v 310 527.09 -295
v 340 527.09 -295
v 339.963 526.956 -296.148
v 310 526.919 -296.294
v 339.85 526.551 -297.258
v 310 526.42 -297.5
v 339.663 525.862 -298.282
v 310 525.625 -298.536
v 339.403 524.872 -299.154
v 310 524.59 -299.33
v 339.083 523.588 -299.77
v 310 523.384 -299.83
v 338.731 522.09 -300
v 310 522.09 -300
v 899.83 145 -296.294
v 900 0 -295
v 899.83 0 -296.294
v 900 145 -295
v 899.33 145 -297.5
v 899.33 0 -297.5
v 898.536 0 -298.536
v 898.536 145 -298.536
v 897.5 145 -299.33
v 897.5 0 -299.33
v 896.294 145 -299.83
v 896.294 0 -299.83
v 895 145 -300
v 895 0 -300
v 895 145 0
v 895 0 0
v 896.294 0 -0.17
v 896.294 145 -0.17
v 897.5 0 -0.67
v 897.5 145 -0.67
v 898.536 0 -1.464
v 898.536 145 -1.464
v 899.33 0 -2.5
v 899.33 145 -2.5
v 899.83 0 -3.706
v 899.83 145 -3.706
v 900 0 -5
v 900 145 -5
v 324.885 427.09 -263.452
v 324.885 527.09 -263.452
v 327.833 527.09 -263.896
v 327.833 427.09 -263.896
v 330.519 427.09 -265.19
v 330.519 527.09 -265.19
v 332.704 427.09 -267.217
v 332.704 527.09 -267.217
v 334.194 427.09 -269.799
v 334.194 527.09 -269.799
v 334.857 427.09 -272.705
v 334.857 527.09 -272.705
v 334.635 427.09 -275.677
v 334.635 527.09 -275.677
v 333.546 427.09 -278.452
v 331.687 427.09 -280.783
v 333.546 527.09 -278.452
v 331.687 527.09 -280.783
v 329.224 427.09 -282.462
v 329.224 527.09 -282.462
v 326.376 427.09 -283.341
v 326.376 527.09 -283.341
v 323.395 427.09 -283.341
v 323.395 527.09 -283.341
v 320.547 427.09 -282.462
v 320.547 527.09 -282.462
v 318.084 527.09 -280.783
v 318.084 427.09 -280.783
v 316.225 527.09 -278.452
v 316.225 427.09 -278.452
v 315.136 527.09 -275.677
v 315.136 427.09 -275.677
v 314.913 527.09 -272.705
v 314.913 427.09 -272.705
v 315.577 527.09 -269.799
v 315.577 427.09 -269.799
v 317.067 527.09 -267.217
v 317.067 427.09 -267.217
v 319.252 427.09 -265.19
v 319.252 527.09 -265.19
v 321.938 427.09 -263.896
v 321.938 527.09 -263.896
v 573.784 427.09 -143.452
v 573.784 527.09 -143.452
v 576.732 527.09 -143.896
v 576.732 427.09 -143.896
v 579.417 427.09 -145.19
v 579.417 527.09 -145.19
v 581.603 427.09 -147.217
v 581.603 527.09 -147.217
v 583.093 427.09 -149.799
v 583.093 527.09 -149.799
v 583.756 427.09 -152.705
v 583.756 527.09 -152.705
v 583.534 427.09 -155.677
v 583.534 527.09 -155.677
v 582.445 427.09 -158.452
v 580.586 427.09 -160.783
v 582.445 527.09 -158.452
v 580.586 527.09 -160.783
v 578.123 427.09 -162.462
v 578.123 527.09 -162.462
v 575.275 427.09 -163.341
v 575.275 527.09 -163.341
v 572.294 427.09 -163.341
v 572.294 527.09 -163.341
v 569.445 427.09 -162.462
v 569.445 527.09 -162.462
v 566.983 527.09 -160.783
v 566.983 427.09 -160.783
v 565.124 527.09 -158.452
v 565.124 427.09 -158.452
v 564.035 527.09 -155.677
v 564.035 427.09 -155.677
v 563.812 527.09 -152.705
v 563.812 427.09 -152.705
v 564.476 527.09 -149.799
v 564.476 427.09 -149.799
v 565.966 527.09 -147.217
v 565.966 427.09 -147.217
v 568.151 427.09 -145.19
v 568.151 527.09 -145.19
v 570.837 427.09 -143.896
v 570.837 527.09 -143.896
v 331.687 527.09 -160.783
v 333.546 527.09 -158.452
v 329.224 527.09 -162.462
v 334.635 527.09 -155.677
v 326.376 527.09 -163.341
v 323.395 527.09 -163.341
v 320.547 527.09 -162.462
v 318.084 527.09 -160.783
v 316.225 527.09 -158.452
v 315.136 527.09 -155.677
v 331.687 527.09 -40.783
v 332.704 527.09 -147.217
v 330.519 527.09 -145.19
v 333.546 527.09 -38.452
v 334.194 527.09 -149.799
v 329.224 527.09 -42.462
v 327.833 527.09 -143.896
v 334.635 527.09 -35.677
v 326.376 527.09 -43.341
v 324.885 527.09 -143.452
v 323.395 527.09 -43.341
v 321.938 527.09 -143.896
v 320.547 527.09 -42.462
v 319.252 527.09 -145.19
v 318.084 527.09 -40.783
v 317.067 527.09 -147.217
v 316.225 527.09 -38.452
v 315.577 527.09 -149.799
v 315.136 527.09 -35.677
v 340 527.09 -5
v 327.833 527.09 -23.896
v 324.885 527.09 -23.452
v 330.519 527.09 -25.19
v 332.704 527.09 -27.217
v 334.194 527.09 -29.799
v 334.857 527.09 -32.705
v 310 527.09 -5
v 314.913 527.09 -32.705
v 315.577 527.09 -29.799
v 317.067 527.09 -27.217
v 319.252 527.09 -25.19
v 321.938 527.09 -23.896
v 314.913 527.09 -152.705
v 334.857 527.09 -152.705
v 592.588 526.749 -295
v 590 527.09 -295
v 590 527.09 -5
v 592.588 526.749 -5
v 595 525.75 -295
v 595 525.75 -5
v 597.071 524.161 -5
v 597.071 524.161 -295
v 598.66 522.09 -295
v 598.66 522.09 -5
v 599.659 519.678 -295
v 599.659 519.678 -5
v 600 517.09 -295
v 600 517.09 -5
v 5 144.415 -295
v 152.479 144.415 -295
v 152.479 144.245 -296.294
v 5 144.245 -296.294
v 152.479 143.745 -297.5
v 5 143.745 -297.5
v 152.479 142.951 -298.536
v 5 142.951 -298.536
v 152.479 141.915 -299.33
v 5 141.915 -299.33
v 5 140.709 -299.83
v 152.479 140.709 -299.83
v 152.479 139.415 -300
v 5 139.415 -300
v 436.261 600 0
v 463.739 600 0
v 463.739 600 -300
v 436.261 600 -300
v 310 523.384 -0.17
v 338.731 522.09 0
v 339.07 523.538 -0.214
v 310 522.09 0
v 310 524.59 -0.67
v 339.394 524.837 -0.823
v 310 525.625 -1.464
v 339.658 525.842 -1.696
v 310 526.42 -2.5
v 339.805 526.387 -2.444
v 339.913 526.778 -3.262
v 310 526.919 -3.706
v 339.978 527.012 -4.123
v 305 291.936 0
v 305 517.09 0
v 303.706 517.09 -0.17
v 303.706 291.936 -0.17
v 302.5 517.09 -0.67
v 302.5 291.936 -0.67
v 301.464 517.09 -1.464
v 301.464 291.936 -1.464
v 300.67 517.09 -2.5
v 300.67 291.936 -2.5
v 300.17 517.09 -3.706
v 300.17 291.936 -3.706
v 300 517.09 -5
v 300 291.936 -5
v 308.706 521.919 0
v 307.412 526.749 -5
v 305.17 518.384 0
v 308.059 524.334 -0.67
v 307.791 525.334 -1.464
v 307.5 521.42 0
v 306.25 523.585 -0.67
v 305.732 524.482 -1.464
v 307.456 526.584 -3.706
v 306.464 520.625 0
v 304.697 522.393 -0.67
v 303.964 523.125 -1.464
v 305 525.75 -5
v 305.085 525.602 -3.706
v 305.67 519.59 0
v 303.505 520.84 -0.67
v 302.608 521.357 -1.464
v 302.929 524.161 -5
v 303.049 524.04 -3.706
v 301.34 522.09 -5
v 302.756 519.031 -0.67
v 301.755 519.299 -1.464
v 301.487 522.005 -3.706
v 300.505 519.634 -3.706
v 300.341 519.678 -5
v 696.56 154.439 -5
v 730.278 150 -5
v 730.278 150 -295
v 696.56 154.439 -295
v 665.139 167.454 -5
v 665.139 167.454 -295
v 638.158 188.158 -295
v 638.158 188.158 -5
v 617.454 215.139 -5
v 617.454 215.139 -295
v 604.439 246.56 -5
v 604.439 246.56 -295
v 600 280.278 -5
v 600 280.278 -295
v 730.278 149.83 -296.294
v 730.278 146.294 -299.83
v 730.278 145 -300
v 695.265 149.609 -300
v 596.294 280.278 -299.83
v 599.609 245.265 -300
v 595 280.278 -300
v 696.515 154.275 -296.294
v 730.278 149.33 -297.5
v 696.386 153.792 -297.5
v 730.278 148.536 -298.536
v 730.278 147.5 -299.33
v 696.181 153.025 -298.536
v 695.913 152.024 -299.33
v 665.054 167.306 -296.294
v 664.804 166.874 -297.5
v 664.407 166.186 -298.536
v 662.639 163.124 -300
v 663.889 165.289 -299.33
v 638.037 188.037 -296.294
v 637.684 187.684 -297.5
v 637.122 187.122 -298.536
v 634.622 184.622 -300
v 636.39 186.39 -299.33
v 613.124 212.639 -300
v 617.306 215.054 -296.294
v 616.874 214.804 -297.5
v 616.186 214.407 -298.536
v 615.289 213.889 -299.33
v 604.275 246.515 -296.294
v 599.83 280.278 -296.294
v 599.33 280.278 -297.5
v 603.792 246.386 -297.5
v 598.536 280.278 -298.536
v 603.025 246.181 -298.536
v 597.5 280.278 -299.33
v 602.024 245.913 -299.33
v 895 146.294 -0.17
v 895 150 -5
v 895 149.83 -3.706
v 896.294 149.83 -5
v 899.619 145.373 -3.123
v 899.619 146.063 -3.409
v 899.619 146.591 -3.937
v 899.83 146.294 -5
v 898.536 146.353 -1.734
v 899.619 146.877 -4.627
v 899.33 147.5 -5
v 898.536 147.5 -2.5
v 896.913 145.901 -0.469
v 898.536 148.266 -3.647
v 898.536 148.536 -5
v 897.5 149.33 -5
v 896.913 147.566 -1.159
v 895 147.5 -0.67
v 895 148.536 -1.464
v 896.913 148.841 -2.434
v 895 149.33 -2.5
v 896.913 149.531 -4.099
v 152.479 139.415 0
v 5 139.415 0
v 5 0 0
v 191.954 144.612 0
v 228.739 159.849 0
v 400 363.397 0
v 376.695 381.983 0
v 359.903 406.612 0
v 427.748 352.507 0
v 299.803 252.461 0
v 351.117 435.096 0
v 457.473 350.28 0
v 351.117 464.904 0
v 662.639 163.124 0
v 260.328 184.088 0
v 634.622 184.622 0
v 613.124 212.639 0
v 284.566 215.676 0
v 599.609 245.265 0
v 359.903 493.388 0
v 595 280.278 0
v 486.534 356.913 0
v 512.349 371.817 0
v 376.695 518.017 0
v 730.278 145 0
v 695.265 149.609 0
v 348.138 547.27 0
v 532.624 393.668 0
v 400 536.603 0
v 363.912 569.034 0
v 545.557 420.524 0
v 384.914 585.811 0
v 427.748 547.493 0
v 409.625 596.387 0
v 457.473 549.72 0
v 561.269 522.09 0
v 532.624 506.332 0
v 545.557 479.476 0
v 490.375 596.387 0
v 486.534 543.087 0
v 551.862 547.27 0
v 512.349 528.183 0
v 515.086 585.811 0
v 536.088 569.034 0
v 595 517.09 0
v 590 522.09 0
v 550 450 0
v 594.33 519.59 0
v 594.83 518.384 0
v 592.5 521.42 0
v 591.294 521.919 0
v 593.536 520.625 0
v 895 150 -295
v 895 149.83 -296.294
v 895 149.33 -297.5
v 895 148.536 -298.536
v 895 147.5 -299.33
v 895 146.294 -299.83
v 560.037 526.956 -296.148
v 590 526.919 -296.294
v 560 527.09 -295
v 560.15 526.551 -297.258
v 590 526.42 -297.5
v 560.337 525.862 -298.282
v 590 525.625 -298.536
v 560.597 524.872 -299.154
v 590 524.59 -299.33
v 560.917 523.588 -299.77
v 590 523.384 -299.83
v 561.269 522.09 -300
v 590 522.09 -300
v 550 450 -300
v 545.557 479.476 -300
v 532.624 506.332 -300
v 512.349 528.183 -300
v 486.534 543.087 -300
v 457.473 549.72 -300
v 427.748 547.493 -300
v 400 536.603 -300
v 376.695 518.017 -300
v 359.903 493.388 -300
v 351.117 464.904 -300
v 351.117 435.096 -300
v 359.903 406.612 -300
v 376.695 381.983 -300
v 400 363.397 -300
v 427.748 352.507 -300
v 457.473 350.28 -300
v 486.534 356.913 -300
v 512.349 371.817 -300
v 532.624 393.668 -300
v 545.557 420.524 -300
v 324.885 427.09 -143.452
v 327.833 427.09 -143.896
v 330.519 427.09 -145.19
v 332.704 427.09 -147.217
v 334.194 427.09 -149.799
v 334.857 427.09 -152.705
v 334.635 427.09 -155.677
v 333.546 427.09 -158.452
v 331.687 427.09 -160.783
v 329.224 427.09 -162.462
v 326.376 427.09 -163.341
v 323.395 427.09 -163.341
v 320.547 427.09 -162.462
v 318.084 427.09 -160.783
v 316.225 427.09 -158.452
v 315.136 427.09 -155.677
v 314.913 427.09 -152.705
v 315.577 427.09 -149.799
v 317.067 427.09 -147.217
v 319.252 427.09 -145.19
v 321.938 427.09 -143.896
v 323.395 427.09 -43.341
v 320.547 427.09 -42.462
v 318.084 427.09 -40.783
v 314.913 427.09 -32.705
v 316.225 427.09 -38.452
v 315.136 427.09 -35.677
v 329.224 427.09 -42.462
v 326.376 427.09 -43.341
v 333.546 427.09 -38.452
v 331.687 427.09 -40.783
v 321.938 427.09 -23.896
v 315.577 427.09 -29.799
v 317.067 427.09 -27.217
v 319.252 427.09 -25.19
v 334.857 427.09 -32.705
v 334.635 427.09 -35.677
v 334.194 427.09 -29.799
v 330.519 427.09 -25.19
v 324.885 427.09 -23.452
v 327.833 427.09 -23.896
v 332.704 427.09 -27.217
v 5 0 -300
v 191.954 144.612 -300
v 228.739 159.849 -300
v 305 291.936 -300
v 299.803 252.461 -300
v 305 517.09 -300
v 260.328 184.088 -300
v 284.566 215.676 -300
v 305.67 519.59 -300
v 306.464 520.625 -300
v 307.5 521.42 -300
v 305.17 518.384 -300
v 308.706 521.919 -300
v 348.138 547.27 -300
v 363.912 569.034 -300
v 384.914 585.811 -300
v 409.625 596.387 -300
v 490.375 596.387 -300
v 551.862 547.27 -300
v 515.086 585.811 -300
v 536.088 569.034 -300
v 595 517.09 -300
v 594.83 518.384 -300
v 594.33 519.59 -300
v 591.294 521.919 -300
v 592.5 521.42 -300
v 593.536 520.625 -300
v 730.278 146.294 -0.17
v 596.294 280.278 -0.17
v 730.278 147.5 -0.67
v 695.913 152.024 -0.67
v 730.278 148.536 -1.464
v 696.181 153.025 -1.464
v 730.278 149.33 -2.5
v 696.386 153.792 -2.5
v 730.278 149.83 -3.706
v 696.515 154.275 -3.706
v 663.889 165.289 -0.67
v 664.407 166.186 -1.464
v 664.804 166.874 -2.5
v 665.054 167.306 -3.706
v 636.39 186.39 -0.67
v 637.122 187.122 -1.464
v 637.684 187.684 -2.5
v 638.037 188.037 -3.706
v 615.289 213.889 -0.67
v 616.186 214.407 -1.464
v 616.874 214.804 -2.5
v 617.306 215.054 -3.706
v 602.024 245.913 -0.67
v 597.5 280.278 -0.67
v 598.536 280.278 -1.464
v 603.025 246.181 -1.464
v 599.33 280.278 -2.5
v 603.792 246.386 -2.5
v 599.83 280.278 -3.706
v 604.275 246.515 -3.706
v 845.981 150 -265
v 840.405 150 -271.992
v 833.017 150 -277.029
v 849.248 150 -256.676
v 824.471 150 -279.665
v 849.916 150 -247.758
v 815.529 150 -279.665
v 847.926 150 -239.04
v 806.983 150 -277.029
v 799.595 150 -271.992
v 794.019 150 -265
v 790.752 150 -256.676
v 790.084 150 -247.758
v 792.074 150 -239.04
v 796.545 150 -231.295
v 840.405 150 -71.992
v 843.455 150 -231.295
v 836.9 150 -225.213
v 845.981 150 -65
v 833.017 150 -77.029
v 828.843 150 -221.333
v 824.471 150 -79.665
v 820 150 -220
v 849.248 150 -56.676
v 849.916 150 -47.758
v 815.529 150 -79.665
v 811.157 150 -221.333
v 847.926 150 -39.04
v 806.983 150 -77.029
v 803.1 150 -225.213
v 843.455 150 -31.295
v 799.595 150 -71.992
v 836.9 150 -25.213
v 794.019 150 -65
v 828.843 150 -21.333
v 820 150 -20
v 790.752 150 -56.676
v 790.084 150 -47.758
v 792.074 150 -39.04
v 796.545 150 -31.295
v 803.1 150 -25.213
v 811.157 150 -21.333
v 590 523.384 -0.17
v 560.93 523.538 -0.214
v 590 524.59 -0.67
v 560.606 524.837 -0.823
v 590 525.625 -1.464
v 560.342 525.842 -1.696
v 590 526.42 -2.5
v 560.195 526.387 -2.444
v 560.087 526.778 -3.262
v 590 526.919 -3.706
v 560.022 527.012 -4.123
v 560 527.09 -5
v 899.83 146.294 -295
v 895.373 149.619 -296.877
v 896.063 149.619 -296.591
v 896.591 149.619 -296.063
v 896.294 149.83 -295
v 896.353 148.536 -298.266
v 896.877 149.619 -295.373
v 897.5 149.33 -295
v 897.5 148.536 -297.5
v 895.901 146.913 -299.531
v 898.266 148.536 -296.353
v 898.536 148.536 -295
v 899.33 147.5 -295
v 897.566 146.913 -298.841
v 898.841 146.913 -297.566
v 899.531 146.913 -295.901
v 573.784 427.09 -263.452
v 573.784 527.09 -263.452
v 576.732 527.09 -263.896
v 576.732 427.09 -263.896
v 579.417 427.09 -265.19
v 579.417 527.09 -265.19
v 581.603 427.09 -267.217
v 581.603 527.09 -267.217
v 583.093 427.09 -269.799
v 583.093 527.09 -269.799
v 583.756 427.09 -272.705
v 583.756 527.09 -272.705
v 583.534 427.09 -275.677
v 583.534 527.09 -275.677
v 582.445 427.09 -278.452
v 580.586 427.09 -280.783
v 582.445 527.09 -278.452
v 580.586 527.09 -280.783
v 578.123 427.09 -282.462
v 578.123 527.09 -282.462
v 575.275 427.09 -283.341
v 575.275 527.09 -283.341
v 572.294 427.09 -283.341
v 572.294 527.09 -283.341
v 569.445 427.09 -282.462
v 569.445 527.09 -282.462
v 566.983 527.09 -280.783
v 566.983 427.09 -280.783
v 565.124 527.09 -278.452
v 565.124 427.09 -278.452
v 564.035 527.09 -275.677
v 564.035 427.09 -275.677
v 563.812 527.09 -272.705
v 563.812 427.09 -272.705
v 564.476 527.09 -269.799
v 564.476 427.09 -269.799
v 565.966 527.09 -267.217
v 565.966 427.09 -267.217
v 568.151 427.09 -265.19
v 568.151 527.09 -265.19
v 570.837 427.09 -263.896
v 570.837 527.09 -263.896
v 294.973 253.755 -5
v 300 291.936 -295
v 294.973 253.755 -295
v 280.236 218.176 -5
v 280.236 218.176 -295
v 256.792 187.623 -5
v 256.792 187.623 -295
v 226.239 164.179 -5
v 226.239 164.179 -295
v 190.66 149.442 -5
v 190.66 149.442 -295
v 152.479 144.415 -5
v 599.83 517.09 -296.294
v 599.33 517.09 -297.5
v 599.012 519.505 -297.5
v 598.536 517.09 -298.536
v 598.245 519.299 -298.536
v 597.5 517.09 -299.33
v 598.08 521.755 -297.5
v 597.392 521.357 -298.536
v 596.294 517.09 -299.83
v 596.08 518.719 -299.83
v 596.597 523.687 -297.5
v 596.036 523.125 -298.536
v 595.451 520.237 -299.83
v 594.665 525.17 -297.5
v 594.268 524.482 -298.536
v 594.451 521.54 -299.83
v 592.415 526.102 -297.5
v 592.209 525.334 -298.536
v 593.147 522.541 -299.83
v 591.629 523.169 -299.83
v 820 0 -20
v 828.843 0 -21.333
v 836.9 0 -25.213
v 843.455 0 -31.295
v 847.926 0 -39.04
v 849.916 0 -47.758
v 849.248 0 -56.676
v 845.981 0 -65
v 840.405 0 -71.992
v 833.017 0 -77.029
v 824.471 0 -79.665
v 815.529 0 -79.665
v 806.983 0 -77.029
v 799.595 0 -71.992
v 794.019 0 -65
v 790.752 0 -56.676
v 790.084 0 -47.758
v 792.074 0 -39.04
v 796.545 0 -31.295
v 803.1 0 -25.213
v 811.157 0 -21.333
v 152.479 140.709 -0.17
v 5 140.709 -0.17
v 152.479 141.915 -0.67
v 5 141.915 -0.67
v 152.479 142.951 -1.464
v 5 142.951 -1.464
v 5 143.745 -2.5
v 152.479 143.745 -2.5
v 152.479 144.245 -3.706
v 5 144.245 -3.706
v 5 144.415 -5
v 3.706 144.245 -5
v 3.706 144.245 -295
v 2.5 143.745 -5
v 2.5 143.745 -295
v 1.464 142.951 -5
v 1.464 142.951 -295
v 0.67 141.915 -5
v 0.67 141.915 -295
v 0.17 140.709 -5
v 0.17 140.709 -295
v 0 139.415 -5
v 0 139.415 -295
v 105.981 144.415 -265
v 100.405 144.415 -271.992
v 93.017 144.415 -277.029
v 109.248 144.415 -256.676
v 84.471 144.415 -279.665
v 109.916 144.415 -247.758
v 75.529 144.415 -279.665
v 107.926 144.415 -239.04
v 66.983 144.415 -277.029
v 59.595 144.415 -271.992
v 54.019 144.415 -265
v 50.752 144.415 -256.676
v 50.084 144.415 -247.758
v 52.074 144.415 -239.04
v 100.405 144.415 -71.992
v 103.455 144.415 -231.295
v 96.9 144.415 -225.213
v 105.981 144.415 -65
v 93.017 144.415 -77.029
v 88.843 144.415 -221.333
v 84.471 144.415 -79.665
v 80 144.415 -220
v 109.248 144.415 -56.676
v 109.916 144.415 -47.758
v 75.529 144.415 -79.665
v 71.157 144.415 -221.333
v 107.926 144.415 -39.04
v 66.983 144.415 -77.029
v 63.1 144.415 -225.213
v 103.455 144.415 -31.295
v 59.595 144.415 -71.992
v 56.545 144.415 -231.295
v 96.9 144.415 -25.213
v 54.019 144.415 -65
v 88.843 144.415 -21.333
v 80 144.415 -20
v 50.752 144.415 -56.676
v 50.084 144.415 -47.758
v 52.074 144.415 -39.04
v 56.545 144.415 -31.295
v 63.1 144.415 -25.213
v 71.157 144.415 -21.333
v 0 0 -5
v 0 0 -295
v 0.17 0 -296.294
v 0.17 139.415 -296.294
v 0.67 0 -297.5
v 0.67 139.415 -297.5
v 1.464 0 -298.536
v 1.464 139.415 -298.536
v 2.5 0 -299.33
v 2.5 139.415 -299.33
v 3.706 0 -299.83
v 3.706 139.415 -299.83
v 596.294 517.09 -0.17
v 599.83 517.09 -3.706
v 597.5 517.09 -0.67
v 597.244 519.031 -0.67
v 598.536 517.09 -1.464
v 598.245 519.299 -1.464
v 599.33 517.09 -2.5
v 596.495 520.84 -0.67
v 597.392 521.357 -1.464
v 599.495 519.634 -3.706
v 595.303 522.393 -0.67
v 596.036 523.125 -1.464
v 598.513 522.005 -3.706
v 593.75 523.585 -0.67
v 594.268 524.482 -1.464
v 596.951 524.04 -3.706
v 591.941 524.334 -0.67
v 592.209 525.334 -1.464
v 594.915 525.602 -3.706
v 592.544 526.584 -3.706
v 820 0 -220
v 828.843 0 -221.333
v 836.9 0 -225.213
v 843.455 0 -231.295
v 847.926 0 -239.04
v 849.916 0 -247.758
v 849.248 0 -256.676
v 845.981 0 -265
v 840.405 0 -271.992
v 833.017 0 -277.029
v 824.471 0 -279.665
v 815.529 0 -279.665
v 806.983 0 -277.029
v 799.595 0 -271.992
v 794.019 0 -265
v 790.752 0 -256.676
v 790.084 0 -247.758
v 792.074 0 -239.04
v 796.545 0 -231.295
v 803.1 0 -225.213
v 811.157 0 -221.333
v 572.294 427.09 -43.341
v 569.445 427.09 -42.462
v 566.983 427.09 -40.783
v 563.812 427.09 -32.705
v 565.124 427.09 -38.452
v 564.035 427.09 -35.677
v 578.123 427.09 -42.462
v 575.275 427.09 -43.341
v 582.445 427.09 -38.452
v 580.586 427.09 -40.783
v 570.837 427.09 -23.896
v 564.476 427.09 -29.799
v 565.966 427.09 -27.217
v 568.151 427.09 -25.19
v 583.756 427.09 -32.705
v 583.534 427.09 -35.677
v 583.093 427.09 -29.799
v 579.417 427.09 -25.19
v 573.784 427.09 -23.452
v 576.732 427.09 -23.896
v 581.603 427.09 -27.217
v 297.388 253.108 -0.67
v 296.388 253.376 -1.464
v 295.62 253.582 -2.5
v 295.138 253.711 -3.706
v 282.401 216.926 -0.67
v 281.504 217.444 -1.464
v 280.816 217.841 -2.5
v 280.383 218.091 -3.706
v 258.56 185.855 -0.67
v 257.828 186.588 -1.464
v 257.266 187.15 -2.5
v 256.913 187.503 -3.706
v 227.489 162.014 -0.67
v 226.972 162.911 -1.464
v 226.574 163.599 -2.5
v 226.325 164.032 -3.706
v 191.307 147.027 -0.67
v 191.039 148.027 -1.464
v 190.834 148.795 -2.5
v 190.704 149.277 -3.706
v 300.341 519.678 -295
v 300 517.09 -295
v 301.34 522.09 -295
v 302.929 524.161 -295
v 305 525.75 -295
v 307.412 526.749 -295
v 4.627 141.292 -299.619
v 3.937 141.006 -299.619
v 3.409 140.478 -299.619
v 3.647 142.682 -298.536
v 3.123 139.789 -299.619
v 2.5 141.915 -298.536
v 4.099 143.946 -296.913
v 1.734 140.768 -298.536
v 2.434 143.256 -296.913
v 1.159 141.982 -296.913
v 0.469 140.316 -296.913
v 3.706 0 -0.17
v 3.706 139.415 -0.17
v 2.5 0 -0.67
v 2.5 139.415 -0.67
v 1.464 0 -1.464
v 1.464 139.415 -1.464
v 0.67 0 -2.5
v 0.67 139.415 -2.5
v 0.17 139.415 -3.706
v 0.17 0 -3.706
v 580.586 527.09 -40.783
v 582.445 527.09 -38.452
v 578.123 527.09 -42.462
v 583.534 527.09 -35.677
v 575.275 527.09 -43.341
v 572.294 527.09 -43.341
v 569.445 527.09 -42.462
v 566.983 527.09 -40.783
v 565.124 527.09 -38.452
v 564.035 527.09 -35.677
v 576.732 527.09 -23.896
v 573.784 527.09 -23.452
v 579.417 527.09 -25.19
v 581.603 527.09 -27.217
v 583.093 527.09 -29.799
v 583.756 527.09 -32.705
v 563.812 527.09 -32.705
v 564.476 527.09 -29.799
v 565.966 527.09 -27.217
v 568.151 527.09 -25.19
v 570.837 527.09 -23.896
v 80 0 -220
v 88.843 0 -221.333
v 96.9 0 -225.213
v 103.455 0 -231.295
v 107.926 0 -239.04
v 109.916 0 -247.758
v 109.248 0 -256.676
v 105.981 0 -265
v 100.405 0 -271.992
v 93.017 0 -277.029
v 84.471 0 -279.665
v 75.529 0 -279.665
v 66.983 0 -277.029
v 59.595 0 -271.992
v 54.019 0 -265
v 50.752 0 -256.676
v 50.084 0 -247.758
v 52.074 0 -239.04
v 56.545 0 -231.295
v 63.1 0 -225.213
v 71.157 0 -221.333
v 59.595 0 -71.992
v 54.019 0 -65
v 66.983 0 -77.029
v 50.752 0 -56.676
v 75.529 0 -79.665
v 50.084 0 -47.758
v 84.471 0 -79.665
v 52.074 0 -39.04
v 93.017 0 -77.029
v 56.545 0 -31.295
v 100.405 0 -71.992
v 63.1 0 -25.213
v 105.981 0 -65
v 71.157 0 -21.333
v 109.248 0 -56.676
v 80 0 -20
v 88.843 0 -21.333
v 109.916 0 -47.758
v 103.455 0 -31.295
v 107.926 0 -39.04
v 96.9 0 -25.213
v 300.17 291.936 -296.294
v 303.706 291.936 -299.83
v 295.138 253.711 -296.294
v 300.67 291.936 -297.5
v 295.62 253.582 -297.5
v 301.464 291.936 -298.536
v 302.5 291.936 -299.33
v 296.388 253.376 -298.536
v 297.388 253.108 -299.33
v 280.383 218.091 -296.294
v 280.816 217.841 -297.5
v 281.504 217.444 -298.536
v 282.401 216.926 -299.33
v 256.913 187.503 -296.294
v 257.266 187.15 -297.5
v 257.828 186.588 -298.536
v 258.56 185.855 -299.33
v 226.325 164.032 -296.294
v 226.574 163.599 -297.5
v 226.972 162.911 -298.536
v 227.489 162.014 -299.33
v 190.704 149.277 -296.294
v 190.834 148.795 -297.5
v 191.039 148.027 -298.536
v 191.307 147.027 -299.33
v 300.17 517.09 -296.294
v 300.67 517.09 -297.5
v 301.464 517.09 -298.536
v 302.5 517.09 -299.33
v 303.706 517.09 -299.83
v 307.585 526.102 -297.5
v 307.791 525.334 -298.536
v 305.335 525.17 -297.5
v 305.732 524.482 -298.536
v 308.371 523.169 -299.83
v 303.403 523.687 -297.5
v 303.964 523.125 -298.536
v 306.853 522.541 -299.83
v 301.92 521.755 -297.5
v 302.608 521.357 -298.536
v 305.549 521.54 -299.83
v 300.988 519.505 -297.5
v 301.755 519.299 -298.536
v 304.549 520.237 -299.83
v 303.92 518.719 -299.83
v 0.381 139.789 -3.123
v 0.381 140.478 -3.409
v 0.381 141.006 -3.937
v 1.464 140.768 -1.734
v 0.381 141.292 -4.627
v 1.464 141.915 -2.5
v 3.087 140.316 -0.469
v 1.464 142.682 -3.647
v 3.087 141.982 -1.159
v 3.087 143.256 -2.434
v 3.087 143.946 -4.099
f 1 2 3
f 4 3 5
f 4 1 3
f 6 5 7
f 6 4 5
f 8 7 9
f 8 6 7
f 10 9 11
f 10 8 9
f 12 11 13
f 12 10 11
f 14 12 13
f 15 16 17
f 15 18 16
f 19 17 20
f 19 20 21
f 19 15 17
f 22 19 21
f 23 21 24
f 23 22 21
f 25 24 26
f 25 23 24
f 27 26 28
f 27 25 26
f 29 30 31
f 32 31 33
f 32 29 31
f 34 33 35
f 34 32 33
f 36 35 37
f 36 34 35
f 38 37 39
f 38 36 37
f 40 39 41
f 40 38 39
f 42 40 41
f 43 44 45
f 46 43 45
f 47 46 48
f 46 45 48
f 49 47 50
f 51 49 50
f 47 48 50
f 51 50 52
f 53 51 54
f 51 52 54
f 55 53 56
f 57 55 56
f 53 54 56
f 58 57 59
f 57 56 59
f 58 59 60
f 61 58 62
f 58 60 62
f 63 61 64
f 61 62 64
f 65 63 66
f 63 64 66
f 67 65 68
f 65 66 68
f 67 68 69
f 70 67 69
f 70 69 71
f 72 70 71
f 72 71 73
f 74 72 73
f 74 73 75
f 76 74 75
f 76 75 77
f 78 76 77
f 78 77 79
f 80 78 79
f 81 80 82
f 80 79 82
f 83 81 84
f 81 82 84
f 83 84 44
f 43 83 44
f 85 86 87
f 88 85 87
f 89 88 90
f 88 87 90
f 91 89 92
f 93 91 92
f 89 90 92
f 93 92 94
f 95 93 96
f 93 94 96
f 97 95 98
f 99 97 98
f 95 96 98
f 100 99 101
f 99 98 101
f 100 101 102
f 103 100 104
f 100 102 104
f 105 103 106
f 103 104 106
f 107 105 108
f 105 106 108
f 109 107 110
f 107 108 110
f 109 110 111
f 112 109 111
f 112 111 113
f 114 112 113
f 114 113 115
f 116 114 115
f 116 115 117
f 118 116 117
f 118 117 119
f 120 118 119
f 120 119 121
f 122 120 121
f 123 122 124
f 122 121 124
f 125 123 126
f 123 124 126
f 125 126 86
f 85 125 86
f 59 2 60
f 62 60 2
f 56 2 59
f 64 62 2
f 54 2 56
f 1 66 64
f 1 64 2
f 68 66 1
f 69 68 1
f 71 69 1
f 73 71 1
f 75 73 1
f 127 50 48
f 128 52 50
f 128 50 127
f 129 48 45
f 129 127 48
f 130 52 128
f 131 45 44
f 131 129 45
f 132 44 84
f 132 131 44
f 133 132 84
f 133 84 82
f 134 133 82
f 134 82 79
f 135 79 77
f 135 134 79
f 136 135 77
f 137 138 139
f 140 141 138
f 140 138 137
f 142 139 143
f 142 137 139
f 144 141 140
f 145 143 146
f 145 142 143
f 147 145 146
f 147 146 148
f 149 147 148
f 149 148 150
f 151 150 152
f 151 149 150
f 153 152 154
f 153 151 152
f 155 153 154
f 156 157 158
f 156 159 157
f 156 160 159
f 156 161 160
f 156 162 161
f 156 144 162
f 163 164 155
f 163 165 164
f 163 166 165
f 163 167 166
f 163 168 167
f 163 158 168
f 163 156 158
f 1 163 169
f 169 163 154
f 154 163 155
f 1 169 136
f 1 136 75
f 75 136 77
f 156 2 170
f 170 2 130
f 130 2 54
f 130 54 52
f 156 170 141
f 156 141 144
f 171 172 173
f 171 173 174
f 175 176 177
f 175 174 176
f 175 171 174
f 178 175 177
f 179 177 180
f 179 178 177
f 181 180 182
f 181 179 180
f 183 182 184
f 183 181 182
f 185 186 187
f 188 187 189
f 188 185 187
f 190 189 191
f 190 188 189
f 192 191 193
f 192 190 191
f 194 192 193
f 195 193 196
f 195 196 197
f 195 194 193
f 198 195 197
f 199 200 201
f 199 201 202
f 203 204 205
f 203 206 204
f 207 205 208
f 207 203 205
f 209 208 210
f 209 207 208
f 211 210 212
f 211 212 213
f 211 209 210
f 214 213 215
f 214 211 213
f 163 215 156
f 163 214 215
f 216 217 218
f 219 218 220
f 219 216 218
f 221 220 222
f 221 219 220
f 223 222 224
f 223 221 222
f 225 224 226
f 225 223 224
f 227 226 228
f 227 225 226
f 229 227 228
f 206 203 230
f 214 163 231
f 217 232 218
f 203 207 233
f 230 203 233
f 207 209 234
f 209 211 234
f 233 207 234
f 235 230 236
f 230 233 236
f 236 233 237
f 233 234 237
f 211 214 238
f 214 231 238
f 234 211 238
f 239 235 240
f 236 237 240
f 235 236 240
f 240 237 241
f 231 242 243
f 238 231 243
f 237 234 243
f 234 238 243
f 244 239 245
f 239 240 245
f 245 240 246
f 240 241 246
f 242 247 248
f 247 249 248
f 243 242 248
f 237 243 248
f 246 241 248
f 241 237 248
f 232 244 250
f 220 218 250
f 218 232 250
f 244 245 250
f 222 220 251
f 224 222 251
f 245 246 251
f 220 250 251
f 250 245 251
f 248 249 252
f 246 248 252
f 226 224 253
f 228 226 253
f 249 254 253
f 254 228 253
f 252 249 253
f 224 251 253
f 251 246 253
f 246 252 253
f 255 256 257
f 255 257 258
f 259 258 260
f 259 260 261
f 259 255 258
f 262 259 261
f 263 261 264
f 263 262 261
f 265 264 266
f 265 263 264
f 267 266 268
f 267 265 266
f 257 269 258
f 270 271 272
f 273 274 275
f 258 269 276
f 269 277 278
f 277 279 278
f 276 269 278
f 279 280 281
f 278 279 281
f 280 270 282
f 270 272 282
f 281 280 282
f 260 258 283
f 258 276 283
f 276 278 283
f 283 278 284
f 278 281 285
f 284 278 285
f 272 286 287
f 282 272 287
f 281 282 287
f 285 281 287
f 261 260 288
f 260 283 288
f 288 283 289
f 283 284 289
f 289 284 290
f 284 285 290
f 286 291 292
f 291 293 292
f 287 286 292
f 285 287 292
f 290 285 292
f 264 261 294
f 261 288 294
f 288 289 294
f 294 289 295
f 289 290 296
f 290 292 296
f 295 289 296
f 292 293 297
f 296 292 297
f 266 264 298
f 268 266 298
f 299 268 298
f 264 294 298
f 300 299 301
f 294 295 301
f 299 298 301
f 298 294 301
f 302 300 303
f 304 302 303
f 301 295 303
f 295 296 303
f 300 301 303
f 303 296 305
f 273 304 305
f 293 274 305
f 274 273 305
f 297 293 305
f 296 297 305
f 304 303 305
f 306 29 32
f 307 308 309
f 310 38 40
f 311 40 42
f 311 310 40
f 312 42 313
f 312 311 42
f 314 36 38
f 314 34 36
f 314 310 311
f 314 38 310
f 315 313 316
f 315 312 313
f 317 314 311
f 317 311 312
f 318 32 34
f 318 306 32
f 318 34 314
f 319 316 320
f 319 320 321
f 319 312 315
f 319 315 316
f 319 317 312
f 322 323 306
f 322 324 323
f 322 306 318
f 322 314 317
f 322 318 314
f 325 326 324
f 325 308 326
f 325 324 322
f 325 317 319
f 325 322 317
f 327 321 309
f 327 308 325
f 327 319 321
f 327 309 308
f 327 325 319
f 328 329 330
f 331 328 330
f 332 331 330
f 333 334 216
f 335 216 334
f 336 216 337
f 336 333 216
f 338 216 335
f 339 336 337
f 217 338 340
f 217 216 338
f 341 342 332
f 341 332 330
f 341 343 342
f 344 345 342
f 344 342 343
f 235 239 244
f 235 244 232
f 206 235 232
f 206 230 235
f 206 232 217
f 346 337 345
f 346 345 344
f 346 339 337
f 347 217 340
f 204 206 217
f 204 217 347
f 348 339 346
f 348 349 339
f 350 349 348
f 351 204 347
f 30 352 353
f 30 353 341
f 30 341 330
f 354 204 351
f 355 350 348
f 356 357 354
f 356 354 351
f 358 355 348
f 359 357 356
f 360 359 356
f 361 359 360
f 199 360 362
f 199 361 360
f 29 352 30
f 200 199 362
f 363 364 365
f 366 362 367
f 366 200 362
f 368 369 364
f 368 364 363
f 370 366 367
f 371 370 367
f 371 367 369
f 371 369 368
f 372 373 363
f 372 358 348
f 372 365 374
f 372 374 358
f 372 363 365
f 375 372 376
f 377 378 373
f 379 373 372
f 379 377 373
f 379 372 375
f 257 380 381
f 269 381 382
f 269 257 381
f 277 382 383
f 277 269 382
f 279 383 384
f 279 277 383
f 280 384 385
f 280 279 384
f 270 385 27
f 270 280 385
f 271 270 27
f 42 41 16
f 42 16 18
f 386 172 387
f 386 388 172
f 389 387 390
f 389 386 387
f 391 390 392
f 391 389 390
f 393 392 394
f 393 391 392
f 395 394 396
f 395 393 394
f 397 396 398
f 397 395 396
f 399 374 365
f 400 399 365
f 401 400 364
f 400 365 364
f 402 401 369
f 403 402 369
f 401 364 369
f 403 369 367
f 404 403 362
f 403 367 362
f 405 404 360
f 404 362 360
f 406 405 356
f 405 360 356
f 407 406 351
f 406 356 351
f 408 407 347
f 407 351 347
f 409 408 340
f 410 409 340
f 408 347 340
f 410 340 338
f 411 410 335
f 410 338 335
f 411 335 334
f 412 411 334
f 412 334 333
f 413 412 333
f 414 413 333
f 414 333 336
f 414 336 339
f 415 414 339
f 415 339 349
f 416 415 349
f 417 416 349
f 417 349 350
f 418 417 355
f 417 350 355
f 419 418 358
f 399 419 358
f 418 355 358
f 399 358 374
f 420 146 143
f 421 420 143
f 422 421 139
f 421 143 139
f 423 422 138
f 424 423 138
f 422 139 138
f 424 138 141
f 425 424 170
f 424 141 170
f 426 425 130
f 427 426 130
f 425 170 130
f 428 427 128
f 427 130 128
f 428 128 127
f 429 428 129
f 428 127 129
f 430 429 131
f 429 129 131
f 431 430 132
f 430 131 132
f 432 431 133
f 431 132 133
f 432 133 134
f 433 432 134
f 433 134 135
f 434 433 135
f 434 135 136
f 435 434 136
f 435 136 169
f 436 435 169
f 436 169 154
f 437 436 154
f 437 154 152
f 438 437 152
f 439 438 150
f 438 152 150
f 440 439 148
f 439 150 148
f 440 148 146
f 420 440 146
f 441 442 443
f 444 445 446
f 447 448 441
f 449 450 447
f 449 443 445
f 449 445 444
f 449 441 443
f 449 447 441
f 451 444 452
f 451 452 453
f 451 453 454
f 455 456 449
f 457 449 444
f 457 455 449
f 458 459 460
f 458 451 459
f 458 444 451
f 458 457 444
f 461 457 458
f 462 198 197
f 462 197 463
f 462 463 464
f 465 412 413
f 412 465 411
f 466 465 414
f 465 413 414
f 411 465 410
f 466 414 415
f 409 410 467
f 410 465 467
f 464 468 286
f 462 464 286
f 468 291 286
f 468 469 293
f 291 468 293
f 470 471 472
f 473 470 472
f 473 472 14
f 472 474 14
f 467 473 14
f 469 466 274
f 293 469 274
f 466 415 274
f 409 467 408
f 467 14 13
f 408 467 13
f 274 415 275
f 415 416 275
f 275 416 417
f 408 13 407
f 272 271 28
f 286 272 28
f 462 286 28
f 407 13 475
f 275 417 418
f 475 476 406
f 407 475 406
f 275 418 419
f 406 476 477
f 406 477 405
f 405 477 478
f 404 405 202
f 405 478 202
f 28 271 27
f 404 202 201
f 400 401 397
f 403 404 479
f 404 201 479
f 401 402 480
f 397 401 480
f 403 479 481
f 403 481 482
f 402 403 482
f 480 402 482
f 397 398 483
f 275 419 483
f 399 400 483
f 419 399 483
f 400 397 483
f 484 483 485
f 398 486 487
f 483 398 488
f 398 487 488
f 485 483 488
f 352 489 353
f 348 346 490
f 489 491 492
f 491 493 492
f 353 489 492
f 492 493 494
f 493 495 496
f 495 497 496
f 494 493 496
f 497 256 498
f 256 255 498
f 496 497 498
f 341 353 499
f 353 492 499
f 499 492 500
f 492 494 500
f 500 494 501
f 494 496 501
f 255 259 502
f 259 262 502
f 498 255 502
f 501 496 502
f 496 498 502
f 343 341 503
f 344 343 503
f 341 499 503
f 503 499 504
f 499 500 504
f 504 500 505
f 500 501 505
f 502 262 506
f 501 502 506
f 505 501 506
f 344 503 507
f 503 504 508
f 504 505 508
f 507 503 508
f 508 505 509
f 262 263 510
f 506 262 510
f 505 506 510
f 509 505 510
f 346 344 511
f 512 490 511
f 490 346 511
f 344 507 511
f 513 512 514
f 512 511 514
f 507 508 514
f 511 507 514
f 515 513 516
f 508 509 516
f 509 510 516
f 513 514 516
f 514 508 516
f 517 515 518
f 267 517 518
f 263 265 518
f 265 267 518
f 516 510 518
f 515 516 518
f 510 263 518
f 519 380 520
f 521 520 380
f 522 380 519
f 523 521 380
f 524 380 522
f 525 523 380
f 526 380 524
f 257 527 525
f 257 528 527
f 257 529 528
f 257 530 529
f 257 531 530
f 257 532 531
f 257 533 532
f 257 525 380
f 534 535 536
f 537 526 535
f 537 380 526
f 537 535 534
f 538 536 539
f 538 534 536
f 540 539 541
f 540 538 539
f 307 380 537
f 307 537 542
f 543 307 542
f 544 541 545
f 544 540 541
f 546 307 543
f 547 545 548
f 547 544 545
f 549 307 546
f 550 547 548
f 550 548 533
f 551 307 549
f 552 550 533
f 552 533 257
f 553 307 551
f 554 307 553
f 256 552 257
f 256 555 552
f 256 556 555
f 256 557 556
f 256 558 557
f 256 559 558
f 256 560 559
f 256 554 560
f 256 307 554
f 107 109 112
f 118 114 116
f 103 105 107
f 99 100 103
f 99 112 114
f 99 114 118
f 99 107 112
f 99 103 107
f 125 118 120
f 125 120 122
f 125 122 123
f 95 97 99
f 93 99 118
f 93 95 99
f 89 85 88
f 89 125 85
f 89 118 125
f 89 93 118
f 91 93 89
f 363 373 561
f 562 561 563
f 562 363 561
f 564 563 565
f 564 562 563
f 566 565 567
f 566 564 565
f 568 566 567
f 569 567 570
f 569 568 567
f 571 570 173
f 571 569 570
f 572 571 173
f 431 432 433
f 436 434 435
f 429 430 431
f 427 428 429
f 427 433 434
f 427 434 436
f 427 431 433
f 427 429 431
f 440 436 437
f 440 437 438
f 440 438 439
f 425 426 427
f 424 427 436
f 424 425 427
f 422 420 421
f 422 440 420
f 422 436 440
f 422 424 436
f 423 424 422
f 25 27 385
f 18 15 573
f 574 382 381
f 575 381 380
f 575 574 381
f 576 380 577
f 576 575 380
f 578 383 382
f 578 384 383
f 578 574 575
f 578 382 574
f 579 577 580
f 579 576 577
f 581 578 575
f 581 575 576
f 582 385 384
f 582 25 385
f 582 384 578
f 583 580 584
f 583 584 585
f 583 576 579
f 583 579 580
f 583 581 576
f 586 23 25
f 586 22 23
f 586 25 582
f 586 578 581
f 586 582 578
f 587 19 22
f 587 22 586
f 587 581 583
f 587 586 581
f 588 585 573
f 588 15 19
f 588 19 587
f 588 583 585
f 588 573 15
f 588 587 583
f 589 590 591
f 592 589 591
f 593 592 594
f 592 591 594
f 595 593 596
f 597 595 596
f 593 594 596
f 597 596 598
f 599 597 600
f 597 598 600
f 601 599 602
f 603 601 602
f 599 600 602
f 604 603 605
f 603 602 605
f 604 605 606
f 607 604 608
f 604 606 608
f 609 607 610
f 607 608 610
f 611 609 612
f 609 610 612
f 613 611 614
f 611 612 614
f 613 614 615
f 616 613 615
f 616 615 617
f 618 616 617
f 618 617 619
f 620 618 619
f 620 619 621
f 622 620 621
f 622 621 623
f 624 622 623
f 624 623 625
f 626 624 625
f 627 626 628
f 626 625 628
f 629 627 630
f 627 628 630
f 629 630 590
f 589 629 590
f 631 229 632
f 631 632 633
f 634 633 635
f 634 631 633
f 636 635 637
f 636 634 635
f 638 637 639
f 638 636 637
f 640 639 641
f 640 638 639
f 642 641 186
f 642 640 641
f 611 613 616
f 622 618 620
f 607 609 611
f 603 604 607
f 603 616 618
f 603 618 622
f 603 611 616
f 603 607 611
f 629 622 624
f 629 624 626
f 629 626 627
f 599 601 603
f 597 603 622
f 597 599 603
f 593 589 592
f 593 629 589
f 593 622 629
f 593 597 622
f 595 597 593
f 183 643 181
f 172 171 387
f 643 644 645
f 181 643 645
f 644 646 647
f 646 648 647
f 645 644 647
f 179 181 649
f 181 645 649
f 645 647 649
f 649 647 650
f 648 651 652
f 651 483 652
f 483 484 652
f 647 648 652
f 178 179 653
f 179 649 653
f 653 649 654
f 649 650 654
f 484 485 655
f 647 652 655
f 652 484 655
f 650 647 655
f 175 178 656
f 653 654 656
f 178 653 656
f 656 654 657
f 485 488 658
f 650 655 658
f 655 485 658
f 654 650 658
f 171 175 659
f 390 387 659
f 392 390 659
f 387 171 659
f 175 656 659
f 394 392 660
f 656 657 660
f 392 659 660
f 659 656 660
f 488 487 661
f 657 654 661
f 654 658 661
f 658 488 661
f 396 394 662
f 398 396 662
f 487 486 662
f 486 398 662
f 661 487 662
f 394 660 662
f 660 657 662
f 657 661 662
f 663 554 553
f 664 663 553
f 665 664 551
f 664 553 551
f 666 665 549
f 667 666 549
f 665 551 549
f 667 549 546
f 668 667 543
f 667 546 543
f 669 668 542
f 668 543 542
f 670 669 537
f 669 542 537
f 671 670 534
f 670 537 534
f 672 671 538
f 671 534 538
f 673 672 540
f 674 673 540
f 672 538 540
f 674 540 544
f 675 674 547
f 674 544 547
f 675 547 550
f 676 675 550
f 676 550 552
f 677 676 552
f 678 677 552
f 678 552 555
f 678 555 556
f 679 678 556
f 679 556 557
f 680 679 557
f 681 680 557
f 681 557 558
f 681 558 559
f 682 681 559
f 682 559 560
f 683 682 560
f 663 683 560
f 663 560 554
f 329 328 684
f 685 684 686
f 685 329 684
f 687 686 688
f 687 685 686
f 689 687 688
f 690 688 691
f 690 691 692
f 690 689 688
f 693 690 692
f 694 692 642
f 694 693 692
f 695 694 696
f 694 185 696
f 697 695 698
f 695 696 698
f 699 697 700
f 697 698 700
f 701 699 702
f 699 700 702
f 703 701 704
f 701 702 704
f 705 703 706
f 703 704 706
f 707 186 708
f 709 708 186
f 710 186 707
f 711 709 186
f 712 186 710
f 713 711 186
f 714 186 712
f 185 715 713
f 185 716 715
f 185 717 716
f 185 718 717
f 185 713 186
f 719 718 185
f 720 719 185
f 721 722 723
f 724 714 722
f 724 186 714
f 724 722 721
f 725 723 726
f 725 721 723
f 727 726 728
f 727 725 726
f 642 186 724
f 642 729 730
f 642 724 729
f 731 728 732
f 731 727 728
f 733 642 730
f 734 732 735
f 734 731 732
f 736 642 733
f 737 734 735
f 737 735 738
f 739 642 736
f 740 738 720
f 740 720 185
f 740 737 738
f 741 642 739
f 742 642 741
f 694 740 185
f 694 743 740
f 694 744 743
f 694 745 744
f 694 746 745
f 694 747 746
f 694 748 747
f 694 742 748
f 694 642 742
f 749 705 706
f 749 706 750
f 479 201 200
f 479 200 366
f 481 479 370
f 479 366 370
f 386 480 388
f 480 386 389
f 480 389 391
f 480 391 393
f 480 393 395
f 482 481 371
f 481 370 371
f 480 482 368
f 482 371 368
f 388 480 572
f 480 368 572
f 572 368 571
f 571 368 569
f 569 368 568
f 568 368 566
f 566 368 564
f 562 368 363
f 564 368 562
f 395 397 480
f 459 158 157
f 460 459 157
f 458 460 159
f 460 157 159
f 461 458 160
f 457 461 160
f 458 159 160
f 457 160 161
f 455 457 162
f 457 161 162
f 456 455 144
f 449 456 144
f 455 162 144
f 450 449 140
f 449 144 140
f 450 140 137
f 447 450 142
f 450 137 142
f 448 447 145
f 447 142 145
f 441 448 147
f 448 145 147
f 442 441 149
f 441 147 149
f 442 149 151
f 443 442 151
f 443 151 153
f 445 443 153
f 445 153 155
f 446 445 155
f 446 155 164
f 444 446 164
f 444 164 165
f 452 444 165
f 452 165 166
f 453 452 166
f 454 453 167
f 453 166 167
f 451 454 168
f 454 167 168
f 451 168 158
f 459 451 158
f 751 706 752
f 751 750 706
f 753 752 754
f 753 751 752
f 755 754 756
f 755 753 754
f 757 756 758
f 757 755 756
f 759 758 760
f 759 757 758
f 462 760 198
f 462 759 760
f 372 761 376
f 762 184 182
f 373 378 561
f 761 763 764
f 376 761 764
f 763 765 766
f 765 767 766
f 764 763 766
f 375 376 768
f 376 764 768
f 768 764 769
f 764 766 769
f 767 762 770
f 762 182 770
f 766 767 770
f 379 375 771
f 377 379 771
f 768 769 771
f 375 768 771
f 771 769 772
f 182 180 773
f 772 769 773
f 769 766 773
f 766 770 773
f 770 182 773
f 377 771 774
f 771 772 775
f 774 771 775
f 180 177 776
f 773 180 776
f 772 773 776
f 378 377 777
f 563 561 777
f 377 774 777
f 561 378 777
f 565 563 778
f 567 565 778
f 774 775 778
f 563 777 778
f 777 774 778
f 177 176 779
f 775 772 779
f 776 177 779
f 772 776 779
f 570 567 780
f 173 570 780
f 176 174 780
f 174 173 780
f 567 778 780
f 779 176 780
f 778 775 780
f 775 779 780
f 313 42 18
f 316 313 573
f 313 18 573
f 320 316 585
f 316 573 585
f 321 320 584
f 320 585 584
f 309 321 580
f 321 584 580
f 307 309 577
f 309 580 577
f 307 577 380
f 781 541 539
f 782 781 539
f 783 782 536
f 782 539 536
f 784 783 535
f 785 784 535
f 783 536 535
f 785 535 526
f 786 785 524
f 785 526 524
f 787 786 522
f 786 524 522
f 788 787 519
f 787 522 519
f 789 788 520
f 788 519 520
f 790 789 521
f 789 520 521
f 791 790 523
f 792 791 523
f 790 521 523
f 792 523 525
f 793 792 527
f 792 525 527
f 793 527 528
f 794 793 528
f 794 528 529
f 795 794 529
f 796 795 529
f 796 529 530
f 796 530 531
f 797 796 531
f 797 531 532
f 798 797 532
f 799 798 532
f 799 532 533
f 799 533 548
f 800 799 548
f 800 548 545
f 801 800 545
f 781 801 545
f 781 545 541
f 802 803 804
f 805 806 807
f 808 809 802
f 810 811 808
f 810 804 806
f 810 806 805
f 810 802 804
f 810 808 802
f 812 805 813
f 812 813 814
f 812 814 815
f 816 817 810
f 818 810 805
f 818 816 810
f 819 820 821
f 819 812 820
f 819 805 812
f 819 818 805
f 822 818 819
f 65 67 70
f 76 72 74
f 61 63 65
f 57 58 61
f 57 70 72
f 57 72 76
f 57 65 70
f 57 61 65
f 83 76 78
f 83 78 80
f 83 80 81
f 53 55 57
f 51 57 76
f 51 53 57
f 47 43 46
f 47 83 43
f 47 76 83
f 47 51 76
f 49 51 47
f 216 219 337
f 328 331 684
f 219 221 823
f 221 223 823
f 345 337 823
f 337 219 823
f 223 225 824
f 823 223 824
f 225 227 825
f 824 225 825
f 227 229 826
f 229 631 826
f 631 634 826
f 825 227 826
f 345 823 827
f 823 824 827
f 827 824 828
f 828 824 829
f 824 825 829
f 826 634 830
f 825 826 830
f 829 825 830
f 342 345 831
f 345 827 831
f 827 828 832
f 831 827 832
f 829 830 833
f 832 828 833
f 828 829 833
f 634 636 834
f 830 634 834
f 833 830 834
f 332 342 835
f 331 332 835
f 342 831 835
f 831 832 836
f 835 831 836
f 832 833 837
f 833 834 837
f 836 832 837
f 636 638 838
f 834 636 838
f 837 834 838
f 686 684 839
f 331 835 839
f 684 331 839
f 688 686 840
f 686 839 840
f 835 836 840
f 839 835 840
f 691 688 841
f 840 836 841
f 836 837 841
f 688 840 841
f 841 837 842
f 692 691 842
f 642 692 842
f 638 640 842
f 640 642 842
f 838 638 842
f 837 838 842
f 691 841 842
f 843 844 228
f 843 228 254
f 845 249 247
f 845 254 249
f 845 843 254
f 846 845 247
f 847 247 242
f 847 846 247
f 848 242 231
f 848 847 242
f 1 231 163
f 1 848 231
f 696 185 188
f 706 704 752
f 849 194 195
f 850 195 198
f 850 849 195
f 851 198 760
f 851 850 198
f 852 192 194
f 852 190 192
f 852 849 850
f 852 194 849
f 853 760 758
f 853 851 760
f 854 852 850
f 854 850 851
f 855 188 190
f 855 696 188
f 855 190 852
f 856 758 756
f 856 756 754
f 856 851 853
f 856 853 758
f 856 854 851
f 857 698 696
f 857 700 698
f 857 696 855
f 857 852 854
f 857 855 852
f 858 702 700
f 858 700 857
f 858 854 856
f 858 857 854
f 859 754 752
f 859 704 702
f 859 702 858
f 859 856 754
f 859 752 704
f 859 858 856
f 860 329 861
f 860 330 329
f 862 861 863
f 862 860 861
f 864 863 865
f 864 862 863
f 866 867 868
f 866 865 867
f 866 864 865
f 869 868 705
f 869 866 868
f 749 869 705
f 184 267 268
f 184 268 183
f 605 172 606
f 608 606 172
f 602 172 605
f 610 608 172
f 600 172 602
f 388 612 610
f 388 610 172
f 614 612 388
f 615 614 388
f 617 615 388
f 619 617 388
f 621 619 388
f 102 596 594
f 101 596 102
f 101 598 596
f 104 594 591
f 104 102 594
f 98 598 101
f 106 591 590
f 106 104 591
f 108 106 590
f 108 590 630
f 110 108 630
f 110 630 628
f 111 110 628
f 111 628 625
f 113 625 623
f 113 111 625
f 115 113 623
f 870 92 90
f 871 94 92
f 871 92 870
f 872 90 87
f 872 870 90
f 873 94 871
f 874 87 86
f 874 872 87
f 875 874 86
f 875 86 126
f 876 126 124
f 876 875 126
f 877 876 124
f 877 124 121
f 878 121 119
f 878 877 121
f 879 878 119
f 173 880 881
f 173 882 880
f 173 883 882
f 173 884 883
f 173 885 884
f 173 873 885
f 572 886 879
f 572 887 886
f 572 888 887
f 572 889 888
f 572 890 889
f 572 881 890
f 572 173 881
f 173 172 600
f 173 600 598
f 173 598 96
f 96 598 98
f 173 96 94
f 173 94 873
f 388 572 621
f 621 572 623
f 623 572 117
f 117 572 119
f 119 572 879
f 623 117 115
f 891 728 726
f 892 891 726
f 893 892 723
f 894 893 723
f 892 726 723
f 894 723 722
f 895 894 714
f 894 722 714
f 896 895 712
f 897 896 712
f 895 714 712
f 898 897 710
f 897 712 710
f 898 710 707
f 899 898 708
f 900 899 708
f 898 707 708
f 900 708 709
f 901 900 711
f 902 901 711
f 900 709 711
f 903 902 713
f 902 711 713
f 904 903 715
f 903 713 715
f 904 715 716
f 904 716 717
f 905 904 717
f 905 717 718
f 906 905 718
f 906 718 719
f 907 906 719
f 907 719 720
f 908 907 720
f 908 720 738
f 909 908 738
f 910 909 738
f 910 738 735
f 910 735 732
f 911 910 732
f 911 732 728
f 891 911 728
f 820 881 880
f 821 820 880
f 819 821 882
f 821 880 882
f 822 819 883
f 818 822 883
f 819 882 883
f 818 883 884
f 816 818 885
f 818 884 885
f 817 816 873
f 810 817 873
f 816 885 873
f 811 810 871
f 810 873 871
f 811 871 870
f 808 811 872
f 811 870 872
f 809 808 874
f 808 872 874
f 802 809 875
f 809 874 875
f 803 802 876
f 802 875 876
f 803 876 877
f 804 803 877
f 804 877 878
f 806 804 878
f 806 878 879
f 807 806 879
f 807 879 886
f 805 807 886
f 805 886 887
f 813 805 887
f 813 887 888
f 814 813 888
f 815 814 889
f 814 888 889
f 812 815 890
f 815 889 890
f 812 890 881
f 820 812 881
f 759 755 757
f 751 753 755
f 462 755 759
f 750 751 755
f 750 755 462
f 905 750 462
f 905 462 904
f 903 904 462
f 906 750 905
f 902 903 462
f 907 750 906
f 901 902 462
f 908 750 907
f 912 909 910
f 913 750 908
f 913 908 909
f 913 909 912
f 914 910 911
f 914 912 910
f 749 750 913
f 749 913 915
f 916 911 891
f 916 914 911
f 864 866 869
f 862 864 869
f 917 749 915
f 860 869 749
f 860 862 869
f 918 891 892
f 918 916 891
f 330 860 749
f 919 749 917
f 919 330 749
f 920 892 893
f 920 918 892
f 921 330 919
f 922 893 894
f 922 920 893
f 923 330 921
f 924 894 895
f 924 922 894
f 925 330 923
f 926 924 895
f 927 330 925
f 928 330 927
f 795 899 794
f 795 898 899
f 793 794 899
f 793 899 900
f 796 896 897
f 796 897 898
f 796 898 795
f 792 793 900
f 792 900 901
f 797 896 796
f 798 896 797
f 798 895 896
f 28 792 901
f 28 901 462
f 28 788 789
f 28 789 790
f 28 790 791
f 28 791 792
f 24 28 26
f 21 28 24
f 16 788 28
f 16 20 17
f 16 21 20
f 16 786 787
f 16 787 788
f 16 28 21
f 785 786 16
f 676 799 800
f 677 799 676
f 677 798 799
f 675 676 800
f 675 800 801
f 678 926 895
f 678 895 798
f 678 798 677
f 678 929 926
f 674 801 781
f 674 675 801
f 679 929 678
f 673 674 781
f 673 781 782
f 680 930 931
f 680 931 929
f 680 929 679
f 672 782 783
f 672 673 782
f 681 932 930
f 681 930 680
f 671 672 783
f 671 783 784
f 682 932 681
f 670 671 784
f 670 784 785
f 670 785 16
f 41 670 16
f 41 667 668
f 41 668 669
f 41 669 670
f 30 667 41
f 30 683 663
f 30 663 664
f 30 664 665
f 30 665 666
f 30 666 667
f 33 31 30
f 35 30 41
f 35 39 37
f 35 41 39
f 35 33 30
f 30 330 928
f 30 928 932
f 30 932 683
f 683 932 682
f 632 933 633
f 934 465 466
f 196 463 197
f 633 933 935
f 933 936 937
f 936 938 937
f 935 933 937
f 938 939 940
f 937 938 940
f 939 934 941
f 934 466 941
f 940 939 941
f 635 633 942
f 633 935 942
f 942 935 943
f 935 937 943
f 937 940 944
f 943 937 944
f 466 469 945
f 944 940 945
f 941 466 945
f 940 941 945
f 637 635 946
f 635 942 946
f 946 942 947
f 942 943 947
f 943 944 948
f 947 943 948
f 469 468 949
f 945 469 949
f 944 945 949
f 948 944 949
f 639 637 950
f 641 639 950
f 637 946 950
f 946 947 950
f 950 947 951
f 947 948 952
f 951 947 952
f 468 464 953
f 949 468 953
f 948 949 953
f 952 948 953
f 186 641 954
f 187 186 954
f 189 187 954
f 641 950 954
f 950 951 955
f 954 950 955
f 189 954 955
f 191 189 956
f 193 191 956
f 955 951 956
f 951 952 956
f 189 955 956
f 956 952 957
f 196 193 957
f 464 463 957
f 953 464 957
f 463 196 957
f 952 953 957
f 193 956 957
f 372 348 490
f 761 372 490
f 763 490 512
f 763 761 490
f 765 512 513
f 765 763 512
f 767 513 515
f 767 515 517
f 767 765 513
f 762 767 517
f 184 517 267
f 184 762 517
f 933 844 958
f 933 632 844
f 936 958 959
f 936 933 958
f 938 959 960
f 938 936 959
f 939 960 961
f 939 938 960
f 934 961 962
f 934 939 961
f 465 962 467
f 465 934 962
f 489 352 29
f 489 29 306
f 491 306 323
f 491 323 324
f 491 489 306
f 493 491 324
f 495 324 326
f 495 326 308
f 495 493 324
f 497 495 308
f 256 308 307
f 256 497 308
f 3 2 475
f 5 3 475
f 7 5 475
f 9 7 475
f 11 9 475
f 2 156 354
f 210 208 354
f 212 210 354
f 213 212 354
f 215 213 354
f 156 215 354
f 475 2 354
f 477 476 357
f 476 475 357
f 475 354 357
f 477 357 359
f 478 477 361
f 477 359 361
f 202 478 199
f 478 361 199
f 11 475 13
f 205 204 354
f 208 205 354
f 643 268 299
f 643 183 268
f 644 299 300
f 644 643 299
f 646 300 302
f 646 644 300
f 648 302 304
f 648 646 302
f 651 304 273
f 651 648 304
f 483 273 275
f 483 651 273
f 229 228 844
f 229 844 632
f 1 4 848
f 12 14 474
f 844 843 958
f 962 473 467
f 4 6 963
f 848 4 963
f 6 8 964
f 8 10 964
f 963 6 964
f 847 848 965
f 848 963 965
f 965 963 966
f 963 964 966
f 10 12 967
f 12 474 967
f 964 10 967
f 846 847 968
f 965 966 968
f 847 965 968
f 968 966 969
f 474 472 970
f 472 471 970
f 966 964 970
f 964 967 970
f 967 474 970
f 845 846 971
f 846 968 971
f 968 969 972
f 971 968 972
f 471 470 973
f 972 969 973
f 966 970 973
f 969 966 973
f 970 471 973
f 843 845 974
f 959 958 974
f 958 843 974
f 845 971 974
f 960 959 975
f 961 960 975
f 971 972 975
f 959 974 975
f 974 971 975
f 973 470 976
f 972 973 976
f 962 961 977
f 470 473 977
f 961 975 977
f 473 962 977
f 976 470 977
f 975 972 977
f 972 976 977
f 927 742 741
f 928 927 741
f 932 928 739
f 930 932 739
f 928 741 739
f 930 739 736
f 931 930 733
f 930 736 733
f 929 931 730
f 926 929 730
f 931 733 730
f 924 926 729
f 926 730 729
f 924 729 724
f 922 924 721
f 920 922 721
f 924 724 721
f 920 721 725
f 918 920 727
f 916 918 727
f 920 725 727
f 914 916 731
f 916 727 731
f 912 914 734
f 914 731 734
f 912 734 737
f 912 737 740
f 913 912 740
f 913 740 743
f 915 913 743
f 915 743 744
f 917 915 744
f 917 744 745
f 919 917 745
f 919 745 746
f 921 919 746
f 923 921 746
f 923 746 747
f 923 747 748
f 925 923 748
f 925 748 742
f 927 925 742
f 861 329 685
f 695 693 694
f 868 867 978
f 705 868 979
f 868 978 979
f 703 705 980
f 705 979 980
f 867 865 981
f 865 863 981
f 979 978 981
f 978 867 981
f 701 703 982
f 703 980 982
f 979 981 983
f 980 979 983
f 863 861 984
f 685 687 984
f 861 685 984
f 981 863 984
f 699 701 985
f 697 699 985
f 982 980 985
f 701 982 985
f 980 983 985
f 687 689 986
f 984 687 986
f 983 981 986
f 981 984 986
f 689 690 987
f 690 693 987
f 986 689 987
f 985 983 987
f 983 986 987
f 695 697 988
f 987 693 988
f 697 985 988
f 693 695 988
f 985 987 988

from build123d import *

# Parameters (mm, degrees)
ESQUISSE1_R                = 100
BOSS_EXTRU_1_DEPTH         = 300
ESQUISSE2_R                = 30
ENL_V_MAT_EXTRU_1_DEPTH    = 300
CONG_3_R                   = 100
CONG_4_R                   = 10
ESQUISSE3_R                = 30
ENL_V_MAT_EXTRU_2_DEPTH    = 300
ESQUISSE4_R                = 10
ENL_V_MAT_EXTRU_3_DEPTH    = 100
R_P_TITION_LIN_AIRE1_COUNT = 3
R_P_TITION_LIN_AIRE1_PITCH = 120
CONG_5_R                   = 5


with BuildPart() as part:
    # Esquisse1 → Boss.-Extru.1 (new body)
    with BuildSketch(Plane.XY):
        with BuildLine():
            Line((0, 0), (900, 0))
            Line((900, 0), (900, 150))
            Line((900, 150), (730.278028845, 150))
            ThreePointArc((730.278028845, 150), (638.157551209, 188.157551209), (600, 280.278028845))
            Line((600, 280.278028845), (600, 375))
            Line((600, 375), (600, 527.089712385))
            Line((600, 527.089712385), (560, 527.089712385))
            Line((560, 527.089712385), (560, 600))
            Line((560, 600), (340, 600))
            Line((340, 600), (340, 527.089712385))
            Line((340, 527.089712385), (300, 527.089712385))
            Line((300, 527.089712385), (300, 375))
            Line((300, 375), (300, 291.936386231))
            ThreePointArc((300, 291.936386231), (256.792071963, 187.623220362), (152.478906094, 144.415292325))
            Line((152.478906094, 144.415292325), (0, 144.415292325))
            Line((0, 144.415292325), (0, 0))
        make_face()
        with Locations((450, 450)):
            Circle(ESQUISSE1_R, mode=Mode.SUBTRACT)
    extrude(amount=-BOSS_EXTRU_1_DEPTH)

    # Esquisse2 → Enlèv. mat.-Extru.1 (cut)
    with BuildSketch(Plane(origin=(0, 144.415292325, 0), x_dir=(1, 0, 0), z_dir=(0, 1, 0))):
        with Locations(Location((80, 250, 0), (0, 0, 270))):
            Circle(ESQUISSE2_R)
        with Locations(Location((80, 50, 0), (0, 0, 270))):
            Circle(ESQUISSE2_R)
    extrude(amount=-ENL_V_MAT_EXTRU_1_DEPTH, mode=Mode.SUBTRACT)

    # Congé3
    # the kernel refuses this fillet: 100 mm, written as the material it takes off along each edge
    with BuildSketch(Plane(origin=(340, 600, 240.652076177), x_dir=(1, 0, 0), z_dir=(0, 0, -1))) as cong_3_piece_1:
        with BuildLine():
            CenterArc((96.260830471, 100), CONG_3_R, 195.717657912, 74.282342088)
            Line((0, 72.910287615), (-1.925216609, 72.368493368))
            ThreePointArc((-1.925216609, 72.368493368), (-2, 36.455143808), (-2, 0))
            Line((-2, 0), (0, -2))
            Line((0, -2), (96.260830471, -2))
            Line((96.260830471, -2), (96.260830471, 0))
        make_face()
    extrude(amount=781.304152354, mode=Mode.SUBTRACT)
    with BuildSketch(Plane(origin=(560, 600, 240.652076177), x_dir=(0, -1, 0), z_dir=(0, 0, -1))) as cong_3_piece_2:
        with BuildLine():
            CenterArc((100, 96.260830471), CONG_3_R, 180, 74.282342088)
            Line((0, 96.260830471), (-2, 96.260830471))
            Line((-2, 96.260830471), (-2, 0))
            Line((-2, 0), (0, -2))
            ThreePointArc((0, -2), (36.455143808, -2), (72.368493368, -1.925216609))
            Line((72.368493368, -1.925216609), (72.910287615, 0))
        make_face()
    extrude(amount=781.304152354, mode=Mode.SUBTRACT)

    # Congé4
    cong_4_edges = [part.edges().sort_by_distance(p)[0] for p in [
        (300, 527.089712385, -150),
        (600, 527.089712385, -150),
    ]]
    fillet(cong_4_edges, radius=CONG_4_R)

    # Esquisse3 → Enlèv. mat.-Extru.2 (cut)
    with BuildSketch(Plane(origin=(0, 150, 0), x_dir=(1, 0, 0), z_dir=(0, 1, 0))):
        with Locations(Location((820, 250, 0), (0, 0, 270))):
            Circle(ESQUISSE3_R)
        with Locations(Location((820, 50, 0), (0, 0, 270))):
            Circle(ESQUISSE3_R)
    extrude(amount=-ENL_V_MAT_EXTRU_2_DEPTH, mode=Mode.SUBTRACT)

    # Esquisse4 → Enlèv. mat.-Extru.3 (cut)
    with BuildSketch(Plane(origin=(0, 527.089712385, 0), x_dir=(1, 0, 0), z_dir=(0, 1, 0))):
        with Locations(Location((573.784271885, 273.452208884, 0), (0, 0, 270))):
            Circle(ESQUISSE4_R)
        with Locations(Location((324.885406348, 273.452208884, 0), (0, 0, 270))):
            Circle(ESQUISSE4_R)
    enl_v_mat_extru_3 = extrude(amount=-ENL_V_MAT_EXTRU_3_DEPTH, mode=Mode.SUBTRACT)

    # Répétition linéaire1: Enlèv. mat.-Extru.3 ×3
    with Locations(*[(0, 0, i * R_P_TITION_LIN_AIRE1_PITCH) for i in range(1, R_P_TITION_LIN_AIRE1_COUNT)]):
        add(enl_v_mat_extru_3, mode=Mode.SUBTRACT)

    # Congé5
    cong_5_edges = [part.edges().sort_by_distance(p)[0] for p in [
        (900, 75, -300),
        (76.239453047, 144.415292325, 0),
        (256.792071963, 187.623220362, 0),
        (815.139014422, 150, -300),
        (325, 527.089712385, 0),
        (600, 398.683870615, 0),
        (638.157551209, 188.157551209, 0),
        (815.139014422, 150, 0),
        (638.157551209, 188.157551209, -300),
        (900, 75, 0),
        (0, 72.207646162, 0),
        (600, 398.683870615, -300),
        (0, 144.415292325, -150),
        (900, 150, -150),
        (325, 527.089712385, -300),
        (0, 72.207646162, -300),
        (256.792071963, 187.623220362, -300),
        (76.239453047, 144.415292325, -300),
        (300, 404.513049308, 0),
        (575, 527.089712385, 0),
        (597.071067812, 524.160780197, 0),
        (302.928932188, 524.160780197, 0),
        (300, 404.513049308, -300),
        (575, 527.089712385, -300),
        (597.071067812, 524.160780197, -300),
        (302.928932188, 524.160780197, -300),
    ]]
    fillet(cong_5_edges, radius=CONG_5_R)


solid = part.part
